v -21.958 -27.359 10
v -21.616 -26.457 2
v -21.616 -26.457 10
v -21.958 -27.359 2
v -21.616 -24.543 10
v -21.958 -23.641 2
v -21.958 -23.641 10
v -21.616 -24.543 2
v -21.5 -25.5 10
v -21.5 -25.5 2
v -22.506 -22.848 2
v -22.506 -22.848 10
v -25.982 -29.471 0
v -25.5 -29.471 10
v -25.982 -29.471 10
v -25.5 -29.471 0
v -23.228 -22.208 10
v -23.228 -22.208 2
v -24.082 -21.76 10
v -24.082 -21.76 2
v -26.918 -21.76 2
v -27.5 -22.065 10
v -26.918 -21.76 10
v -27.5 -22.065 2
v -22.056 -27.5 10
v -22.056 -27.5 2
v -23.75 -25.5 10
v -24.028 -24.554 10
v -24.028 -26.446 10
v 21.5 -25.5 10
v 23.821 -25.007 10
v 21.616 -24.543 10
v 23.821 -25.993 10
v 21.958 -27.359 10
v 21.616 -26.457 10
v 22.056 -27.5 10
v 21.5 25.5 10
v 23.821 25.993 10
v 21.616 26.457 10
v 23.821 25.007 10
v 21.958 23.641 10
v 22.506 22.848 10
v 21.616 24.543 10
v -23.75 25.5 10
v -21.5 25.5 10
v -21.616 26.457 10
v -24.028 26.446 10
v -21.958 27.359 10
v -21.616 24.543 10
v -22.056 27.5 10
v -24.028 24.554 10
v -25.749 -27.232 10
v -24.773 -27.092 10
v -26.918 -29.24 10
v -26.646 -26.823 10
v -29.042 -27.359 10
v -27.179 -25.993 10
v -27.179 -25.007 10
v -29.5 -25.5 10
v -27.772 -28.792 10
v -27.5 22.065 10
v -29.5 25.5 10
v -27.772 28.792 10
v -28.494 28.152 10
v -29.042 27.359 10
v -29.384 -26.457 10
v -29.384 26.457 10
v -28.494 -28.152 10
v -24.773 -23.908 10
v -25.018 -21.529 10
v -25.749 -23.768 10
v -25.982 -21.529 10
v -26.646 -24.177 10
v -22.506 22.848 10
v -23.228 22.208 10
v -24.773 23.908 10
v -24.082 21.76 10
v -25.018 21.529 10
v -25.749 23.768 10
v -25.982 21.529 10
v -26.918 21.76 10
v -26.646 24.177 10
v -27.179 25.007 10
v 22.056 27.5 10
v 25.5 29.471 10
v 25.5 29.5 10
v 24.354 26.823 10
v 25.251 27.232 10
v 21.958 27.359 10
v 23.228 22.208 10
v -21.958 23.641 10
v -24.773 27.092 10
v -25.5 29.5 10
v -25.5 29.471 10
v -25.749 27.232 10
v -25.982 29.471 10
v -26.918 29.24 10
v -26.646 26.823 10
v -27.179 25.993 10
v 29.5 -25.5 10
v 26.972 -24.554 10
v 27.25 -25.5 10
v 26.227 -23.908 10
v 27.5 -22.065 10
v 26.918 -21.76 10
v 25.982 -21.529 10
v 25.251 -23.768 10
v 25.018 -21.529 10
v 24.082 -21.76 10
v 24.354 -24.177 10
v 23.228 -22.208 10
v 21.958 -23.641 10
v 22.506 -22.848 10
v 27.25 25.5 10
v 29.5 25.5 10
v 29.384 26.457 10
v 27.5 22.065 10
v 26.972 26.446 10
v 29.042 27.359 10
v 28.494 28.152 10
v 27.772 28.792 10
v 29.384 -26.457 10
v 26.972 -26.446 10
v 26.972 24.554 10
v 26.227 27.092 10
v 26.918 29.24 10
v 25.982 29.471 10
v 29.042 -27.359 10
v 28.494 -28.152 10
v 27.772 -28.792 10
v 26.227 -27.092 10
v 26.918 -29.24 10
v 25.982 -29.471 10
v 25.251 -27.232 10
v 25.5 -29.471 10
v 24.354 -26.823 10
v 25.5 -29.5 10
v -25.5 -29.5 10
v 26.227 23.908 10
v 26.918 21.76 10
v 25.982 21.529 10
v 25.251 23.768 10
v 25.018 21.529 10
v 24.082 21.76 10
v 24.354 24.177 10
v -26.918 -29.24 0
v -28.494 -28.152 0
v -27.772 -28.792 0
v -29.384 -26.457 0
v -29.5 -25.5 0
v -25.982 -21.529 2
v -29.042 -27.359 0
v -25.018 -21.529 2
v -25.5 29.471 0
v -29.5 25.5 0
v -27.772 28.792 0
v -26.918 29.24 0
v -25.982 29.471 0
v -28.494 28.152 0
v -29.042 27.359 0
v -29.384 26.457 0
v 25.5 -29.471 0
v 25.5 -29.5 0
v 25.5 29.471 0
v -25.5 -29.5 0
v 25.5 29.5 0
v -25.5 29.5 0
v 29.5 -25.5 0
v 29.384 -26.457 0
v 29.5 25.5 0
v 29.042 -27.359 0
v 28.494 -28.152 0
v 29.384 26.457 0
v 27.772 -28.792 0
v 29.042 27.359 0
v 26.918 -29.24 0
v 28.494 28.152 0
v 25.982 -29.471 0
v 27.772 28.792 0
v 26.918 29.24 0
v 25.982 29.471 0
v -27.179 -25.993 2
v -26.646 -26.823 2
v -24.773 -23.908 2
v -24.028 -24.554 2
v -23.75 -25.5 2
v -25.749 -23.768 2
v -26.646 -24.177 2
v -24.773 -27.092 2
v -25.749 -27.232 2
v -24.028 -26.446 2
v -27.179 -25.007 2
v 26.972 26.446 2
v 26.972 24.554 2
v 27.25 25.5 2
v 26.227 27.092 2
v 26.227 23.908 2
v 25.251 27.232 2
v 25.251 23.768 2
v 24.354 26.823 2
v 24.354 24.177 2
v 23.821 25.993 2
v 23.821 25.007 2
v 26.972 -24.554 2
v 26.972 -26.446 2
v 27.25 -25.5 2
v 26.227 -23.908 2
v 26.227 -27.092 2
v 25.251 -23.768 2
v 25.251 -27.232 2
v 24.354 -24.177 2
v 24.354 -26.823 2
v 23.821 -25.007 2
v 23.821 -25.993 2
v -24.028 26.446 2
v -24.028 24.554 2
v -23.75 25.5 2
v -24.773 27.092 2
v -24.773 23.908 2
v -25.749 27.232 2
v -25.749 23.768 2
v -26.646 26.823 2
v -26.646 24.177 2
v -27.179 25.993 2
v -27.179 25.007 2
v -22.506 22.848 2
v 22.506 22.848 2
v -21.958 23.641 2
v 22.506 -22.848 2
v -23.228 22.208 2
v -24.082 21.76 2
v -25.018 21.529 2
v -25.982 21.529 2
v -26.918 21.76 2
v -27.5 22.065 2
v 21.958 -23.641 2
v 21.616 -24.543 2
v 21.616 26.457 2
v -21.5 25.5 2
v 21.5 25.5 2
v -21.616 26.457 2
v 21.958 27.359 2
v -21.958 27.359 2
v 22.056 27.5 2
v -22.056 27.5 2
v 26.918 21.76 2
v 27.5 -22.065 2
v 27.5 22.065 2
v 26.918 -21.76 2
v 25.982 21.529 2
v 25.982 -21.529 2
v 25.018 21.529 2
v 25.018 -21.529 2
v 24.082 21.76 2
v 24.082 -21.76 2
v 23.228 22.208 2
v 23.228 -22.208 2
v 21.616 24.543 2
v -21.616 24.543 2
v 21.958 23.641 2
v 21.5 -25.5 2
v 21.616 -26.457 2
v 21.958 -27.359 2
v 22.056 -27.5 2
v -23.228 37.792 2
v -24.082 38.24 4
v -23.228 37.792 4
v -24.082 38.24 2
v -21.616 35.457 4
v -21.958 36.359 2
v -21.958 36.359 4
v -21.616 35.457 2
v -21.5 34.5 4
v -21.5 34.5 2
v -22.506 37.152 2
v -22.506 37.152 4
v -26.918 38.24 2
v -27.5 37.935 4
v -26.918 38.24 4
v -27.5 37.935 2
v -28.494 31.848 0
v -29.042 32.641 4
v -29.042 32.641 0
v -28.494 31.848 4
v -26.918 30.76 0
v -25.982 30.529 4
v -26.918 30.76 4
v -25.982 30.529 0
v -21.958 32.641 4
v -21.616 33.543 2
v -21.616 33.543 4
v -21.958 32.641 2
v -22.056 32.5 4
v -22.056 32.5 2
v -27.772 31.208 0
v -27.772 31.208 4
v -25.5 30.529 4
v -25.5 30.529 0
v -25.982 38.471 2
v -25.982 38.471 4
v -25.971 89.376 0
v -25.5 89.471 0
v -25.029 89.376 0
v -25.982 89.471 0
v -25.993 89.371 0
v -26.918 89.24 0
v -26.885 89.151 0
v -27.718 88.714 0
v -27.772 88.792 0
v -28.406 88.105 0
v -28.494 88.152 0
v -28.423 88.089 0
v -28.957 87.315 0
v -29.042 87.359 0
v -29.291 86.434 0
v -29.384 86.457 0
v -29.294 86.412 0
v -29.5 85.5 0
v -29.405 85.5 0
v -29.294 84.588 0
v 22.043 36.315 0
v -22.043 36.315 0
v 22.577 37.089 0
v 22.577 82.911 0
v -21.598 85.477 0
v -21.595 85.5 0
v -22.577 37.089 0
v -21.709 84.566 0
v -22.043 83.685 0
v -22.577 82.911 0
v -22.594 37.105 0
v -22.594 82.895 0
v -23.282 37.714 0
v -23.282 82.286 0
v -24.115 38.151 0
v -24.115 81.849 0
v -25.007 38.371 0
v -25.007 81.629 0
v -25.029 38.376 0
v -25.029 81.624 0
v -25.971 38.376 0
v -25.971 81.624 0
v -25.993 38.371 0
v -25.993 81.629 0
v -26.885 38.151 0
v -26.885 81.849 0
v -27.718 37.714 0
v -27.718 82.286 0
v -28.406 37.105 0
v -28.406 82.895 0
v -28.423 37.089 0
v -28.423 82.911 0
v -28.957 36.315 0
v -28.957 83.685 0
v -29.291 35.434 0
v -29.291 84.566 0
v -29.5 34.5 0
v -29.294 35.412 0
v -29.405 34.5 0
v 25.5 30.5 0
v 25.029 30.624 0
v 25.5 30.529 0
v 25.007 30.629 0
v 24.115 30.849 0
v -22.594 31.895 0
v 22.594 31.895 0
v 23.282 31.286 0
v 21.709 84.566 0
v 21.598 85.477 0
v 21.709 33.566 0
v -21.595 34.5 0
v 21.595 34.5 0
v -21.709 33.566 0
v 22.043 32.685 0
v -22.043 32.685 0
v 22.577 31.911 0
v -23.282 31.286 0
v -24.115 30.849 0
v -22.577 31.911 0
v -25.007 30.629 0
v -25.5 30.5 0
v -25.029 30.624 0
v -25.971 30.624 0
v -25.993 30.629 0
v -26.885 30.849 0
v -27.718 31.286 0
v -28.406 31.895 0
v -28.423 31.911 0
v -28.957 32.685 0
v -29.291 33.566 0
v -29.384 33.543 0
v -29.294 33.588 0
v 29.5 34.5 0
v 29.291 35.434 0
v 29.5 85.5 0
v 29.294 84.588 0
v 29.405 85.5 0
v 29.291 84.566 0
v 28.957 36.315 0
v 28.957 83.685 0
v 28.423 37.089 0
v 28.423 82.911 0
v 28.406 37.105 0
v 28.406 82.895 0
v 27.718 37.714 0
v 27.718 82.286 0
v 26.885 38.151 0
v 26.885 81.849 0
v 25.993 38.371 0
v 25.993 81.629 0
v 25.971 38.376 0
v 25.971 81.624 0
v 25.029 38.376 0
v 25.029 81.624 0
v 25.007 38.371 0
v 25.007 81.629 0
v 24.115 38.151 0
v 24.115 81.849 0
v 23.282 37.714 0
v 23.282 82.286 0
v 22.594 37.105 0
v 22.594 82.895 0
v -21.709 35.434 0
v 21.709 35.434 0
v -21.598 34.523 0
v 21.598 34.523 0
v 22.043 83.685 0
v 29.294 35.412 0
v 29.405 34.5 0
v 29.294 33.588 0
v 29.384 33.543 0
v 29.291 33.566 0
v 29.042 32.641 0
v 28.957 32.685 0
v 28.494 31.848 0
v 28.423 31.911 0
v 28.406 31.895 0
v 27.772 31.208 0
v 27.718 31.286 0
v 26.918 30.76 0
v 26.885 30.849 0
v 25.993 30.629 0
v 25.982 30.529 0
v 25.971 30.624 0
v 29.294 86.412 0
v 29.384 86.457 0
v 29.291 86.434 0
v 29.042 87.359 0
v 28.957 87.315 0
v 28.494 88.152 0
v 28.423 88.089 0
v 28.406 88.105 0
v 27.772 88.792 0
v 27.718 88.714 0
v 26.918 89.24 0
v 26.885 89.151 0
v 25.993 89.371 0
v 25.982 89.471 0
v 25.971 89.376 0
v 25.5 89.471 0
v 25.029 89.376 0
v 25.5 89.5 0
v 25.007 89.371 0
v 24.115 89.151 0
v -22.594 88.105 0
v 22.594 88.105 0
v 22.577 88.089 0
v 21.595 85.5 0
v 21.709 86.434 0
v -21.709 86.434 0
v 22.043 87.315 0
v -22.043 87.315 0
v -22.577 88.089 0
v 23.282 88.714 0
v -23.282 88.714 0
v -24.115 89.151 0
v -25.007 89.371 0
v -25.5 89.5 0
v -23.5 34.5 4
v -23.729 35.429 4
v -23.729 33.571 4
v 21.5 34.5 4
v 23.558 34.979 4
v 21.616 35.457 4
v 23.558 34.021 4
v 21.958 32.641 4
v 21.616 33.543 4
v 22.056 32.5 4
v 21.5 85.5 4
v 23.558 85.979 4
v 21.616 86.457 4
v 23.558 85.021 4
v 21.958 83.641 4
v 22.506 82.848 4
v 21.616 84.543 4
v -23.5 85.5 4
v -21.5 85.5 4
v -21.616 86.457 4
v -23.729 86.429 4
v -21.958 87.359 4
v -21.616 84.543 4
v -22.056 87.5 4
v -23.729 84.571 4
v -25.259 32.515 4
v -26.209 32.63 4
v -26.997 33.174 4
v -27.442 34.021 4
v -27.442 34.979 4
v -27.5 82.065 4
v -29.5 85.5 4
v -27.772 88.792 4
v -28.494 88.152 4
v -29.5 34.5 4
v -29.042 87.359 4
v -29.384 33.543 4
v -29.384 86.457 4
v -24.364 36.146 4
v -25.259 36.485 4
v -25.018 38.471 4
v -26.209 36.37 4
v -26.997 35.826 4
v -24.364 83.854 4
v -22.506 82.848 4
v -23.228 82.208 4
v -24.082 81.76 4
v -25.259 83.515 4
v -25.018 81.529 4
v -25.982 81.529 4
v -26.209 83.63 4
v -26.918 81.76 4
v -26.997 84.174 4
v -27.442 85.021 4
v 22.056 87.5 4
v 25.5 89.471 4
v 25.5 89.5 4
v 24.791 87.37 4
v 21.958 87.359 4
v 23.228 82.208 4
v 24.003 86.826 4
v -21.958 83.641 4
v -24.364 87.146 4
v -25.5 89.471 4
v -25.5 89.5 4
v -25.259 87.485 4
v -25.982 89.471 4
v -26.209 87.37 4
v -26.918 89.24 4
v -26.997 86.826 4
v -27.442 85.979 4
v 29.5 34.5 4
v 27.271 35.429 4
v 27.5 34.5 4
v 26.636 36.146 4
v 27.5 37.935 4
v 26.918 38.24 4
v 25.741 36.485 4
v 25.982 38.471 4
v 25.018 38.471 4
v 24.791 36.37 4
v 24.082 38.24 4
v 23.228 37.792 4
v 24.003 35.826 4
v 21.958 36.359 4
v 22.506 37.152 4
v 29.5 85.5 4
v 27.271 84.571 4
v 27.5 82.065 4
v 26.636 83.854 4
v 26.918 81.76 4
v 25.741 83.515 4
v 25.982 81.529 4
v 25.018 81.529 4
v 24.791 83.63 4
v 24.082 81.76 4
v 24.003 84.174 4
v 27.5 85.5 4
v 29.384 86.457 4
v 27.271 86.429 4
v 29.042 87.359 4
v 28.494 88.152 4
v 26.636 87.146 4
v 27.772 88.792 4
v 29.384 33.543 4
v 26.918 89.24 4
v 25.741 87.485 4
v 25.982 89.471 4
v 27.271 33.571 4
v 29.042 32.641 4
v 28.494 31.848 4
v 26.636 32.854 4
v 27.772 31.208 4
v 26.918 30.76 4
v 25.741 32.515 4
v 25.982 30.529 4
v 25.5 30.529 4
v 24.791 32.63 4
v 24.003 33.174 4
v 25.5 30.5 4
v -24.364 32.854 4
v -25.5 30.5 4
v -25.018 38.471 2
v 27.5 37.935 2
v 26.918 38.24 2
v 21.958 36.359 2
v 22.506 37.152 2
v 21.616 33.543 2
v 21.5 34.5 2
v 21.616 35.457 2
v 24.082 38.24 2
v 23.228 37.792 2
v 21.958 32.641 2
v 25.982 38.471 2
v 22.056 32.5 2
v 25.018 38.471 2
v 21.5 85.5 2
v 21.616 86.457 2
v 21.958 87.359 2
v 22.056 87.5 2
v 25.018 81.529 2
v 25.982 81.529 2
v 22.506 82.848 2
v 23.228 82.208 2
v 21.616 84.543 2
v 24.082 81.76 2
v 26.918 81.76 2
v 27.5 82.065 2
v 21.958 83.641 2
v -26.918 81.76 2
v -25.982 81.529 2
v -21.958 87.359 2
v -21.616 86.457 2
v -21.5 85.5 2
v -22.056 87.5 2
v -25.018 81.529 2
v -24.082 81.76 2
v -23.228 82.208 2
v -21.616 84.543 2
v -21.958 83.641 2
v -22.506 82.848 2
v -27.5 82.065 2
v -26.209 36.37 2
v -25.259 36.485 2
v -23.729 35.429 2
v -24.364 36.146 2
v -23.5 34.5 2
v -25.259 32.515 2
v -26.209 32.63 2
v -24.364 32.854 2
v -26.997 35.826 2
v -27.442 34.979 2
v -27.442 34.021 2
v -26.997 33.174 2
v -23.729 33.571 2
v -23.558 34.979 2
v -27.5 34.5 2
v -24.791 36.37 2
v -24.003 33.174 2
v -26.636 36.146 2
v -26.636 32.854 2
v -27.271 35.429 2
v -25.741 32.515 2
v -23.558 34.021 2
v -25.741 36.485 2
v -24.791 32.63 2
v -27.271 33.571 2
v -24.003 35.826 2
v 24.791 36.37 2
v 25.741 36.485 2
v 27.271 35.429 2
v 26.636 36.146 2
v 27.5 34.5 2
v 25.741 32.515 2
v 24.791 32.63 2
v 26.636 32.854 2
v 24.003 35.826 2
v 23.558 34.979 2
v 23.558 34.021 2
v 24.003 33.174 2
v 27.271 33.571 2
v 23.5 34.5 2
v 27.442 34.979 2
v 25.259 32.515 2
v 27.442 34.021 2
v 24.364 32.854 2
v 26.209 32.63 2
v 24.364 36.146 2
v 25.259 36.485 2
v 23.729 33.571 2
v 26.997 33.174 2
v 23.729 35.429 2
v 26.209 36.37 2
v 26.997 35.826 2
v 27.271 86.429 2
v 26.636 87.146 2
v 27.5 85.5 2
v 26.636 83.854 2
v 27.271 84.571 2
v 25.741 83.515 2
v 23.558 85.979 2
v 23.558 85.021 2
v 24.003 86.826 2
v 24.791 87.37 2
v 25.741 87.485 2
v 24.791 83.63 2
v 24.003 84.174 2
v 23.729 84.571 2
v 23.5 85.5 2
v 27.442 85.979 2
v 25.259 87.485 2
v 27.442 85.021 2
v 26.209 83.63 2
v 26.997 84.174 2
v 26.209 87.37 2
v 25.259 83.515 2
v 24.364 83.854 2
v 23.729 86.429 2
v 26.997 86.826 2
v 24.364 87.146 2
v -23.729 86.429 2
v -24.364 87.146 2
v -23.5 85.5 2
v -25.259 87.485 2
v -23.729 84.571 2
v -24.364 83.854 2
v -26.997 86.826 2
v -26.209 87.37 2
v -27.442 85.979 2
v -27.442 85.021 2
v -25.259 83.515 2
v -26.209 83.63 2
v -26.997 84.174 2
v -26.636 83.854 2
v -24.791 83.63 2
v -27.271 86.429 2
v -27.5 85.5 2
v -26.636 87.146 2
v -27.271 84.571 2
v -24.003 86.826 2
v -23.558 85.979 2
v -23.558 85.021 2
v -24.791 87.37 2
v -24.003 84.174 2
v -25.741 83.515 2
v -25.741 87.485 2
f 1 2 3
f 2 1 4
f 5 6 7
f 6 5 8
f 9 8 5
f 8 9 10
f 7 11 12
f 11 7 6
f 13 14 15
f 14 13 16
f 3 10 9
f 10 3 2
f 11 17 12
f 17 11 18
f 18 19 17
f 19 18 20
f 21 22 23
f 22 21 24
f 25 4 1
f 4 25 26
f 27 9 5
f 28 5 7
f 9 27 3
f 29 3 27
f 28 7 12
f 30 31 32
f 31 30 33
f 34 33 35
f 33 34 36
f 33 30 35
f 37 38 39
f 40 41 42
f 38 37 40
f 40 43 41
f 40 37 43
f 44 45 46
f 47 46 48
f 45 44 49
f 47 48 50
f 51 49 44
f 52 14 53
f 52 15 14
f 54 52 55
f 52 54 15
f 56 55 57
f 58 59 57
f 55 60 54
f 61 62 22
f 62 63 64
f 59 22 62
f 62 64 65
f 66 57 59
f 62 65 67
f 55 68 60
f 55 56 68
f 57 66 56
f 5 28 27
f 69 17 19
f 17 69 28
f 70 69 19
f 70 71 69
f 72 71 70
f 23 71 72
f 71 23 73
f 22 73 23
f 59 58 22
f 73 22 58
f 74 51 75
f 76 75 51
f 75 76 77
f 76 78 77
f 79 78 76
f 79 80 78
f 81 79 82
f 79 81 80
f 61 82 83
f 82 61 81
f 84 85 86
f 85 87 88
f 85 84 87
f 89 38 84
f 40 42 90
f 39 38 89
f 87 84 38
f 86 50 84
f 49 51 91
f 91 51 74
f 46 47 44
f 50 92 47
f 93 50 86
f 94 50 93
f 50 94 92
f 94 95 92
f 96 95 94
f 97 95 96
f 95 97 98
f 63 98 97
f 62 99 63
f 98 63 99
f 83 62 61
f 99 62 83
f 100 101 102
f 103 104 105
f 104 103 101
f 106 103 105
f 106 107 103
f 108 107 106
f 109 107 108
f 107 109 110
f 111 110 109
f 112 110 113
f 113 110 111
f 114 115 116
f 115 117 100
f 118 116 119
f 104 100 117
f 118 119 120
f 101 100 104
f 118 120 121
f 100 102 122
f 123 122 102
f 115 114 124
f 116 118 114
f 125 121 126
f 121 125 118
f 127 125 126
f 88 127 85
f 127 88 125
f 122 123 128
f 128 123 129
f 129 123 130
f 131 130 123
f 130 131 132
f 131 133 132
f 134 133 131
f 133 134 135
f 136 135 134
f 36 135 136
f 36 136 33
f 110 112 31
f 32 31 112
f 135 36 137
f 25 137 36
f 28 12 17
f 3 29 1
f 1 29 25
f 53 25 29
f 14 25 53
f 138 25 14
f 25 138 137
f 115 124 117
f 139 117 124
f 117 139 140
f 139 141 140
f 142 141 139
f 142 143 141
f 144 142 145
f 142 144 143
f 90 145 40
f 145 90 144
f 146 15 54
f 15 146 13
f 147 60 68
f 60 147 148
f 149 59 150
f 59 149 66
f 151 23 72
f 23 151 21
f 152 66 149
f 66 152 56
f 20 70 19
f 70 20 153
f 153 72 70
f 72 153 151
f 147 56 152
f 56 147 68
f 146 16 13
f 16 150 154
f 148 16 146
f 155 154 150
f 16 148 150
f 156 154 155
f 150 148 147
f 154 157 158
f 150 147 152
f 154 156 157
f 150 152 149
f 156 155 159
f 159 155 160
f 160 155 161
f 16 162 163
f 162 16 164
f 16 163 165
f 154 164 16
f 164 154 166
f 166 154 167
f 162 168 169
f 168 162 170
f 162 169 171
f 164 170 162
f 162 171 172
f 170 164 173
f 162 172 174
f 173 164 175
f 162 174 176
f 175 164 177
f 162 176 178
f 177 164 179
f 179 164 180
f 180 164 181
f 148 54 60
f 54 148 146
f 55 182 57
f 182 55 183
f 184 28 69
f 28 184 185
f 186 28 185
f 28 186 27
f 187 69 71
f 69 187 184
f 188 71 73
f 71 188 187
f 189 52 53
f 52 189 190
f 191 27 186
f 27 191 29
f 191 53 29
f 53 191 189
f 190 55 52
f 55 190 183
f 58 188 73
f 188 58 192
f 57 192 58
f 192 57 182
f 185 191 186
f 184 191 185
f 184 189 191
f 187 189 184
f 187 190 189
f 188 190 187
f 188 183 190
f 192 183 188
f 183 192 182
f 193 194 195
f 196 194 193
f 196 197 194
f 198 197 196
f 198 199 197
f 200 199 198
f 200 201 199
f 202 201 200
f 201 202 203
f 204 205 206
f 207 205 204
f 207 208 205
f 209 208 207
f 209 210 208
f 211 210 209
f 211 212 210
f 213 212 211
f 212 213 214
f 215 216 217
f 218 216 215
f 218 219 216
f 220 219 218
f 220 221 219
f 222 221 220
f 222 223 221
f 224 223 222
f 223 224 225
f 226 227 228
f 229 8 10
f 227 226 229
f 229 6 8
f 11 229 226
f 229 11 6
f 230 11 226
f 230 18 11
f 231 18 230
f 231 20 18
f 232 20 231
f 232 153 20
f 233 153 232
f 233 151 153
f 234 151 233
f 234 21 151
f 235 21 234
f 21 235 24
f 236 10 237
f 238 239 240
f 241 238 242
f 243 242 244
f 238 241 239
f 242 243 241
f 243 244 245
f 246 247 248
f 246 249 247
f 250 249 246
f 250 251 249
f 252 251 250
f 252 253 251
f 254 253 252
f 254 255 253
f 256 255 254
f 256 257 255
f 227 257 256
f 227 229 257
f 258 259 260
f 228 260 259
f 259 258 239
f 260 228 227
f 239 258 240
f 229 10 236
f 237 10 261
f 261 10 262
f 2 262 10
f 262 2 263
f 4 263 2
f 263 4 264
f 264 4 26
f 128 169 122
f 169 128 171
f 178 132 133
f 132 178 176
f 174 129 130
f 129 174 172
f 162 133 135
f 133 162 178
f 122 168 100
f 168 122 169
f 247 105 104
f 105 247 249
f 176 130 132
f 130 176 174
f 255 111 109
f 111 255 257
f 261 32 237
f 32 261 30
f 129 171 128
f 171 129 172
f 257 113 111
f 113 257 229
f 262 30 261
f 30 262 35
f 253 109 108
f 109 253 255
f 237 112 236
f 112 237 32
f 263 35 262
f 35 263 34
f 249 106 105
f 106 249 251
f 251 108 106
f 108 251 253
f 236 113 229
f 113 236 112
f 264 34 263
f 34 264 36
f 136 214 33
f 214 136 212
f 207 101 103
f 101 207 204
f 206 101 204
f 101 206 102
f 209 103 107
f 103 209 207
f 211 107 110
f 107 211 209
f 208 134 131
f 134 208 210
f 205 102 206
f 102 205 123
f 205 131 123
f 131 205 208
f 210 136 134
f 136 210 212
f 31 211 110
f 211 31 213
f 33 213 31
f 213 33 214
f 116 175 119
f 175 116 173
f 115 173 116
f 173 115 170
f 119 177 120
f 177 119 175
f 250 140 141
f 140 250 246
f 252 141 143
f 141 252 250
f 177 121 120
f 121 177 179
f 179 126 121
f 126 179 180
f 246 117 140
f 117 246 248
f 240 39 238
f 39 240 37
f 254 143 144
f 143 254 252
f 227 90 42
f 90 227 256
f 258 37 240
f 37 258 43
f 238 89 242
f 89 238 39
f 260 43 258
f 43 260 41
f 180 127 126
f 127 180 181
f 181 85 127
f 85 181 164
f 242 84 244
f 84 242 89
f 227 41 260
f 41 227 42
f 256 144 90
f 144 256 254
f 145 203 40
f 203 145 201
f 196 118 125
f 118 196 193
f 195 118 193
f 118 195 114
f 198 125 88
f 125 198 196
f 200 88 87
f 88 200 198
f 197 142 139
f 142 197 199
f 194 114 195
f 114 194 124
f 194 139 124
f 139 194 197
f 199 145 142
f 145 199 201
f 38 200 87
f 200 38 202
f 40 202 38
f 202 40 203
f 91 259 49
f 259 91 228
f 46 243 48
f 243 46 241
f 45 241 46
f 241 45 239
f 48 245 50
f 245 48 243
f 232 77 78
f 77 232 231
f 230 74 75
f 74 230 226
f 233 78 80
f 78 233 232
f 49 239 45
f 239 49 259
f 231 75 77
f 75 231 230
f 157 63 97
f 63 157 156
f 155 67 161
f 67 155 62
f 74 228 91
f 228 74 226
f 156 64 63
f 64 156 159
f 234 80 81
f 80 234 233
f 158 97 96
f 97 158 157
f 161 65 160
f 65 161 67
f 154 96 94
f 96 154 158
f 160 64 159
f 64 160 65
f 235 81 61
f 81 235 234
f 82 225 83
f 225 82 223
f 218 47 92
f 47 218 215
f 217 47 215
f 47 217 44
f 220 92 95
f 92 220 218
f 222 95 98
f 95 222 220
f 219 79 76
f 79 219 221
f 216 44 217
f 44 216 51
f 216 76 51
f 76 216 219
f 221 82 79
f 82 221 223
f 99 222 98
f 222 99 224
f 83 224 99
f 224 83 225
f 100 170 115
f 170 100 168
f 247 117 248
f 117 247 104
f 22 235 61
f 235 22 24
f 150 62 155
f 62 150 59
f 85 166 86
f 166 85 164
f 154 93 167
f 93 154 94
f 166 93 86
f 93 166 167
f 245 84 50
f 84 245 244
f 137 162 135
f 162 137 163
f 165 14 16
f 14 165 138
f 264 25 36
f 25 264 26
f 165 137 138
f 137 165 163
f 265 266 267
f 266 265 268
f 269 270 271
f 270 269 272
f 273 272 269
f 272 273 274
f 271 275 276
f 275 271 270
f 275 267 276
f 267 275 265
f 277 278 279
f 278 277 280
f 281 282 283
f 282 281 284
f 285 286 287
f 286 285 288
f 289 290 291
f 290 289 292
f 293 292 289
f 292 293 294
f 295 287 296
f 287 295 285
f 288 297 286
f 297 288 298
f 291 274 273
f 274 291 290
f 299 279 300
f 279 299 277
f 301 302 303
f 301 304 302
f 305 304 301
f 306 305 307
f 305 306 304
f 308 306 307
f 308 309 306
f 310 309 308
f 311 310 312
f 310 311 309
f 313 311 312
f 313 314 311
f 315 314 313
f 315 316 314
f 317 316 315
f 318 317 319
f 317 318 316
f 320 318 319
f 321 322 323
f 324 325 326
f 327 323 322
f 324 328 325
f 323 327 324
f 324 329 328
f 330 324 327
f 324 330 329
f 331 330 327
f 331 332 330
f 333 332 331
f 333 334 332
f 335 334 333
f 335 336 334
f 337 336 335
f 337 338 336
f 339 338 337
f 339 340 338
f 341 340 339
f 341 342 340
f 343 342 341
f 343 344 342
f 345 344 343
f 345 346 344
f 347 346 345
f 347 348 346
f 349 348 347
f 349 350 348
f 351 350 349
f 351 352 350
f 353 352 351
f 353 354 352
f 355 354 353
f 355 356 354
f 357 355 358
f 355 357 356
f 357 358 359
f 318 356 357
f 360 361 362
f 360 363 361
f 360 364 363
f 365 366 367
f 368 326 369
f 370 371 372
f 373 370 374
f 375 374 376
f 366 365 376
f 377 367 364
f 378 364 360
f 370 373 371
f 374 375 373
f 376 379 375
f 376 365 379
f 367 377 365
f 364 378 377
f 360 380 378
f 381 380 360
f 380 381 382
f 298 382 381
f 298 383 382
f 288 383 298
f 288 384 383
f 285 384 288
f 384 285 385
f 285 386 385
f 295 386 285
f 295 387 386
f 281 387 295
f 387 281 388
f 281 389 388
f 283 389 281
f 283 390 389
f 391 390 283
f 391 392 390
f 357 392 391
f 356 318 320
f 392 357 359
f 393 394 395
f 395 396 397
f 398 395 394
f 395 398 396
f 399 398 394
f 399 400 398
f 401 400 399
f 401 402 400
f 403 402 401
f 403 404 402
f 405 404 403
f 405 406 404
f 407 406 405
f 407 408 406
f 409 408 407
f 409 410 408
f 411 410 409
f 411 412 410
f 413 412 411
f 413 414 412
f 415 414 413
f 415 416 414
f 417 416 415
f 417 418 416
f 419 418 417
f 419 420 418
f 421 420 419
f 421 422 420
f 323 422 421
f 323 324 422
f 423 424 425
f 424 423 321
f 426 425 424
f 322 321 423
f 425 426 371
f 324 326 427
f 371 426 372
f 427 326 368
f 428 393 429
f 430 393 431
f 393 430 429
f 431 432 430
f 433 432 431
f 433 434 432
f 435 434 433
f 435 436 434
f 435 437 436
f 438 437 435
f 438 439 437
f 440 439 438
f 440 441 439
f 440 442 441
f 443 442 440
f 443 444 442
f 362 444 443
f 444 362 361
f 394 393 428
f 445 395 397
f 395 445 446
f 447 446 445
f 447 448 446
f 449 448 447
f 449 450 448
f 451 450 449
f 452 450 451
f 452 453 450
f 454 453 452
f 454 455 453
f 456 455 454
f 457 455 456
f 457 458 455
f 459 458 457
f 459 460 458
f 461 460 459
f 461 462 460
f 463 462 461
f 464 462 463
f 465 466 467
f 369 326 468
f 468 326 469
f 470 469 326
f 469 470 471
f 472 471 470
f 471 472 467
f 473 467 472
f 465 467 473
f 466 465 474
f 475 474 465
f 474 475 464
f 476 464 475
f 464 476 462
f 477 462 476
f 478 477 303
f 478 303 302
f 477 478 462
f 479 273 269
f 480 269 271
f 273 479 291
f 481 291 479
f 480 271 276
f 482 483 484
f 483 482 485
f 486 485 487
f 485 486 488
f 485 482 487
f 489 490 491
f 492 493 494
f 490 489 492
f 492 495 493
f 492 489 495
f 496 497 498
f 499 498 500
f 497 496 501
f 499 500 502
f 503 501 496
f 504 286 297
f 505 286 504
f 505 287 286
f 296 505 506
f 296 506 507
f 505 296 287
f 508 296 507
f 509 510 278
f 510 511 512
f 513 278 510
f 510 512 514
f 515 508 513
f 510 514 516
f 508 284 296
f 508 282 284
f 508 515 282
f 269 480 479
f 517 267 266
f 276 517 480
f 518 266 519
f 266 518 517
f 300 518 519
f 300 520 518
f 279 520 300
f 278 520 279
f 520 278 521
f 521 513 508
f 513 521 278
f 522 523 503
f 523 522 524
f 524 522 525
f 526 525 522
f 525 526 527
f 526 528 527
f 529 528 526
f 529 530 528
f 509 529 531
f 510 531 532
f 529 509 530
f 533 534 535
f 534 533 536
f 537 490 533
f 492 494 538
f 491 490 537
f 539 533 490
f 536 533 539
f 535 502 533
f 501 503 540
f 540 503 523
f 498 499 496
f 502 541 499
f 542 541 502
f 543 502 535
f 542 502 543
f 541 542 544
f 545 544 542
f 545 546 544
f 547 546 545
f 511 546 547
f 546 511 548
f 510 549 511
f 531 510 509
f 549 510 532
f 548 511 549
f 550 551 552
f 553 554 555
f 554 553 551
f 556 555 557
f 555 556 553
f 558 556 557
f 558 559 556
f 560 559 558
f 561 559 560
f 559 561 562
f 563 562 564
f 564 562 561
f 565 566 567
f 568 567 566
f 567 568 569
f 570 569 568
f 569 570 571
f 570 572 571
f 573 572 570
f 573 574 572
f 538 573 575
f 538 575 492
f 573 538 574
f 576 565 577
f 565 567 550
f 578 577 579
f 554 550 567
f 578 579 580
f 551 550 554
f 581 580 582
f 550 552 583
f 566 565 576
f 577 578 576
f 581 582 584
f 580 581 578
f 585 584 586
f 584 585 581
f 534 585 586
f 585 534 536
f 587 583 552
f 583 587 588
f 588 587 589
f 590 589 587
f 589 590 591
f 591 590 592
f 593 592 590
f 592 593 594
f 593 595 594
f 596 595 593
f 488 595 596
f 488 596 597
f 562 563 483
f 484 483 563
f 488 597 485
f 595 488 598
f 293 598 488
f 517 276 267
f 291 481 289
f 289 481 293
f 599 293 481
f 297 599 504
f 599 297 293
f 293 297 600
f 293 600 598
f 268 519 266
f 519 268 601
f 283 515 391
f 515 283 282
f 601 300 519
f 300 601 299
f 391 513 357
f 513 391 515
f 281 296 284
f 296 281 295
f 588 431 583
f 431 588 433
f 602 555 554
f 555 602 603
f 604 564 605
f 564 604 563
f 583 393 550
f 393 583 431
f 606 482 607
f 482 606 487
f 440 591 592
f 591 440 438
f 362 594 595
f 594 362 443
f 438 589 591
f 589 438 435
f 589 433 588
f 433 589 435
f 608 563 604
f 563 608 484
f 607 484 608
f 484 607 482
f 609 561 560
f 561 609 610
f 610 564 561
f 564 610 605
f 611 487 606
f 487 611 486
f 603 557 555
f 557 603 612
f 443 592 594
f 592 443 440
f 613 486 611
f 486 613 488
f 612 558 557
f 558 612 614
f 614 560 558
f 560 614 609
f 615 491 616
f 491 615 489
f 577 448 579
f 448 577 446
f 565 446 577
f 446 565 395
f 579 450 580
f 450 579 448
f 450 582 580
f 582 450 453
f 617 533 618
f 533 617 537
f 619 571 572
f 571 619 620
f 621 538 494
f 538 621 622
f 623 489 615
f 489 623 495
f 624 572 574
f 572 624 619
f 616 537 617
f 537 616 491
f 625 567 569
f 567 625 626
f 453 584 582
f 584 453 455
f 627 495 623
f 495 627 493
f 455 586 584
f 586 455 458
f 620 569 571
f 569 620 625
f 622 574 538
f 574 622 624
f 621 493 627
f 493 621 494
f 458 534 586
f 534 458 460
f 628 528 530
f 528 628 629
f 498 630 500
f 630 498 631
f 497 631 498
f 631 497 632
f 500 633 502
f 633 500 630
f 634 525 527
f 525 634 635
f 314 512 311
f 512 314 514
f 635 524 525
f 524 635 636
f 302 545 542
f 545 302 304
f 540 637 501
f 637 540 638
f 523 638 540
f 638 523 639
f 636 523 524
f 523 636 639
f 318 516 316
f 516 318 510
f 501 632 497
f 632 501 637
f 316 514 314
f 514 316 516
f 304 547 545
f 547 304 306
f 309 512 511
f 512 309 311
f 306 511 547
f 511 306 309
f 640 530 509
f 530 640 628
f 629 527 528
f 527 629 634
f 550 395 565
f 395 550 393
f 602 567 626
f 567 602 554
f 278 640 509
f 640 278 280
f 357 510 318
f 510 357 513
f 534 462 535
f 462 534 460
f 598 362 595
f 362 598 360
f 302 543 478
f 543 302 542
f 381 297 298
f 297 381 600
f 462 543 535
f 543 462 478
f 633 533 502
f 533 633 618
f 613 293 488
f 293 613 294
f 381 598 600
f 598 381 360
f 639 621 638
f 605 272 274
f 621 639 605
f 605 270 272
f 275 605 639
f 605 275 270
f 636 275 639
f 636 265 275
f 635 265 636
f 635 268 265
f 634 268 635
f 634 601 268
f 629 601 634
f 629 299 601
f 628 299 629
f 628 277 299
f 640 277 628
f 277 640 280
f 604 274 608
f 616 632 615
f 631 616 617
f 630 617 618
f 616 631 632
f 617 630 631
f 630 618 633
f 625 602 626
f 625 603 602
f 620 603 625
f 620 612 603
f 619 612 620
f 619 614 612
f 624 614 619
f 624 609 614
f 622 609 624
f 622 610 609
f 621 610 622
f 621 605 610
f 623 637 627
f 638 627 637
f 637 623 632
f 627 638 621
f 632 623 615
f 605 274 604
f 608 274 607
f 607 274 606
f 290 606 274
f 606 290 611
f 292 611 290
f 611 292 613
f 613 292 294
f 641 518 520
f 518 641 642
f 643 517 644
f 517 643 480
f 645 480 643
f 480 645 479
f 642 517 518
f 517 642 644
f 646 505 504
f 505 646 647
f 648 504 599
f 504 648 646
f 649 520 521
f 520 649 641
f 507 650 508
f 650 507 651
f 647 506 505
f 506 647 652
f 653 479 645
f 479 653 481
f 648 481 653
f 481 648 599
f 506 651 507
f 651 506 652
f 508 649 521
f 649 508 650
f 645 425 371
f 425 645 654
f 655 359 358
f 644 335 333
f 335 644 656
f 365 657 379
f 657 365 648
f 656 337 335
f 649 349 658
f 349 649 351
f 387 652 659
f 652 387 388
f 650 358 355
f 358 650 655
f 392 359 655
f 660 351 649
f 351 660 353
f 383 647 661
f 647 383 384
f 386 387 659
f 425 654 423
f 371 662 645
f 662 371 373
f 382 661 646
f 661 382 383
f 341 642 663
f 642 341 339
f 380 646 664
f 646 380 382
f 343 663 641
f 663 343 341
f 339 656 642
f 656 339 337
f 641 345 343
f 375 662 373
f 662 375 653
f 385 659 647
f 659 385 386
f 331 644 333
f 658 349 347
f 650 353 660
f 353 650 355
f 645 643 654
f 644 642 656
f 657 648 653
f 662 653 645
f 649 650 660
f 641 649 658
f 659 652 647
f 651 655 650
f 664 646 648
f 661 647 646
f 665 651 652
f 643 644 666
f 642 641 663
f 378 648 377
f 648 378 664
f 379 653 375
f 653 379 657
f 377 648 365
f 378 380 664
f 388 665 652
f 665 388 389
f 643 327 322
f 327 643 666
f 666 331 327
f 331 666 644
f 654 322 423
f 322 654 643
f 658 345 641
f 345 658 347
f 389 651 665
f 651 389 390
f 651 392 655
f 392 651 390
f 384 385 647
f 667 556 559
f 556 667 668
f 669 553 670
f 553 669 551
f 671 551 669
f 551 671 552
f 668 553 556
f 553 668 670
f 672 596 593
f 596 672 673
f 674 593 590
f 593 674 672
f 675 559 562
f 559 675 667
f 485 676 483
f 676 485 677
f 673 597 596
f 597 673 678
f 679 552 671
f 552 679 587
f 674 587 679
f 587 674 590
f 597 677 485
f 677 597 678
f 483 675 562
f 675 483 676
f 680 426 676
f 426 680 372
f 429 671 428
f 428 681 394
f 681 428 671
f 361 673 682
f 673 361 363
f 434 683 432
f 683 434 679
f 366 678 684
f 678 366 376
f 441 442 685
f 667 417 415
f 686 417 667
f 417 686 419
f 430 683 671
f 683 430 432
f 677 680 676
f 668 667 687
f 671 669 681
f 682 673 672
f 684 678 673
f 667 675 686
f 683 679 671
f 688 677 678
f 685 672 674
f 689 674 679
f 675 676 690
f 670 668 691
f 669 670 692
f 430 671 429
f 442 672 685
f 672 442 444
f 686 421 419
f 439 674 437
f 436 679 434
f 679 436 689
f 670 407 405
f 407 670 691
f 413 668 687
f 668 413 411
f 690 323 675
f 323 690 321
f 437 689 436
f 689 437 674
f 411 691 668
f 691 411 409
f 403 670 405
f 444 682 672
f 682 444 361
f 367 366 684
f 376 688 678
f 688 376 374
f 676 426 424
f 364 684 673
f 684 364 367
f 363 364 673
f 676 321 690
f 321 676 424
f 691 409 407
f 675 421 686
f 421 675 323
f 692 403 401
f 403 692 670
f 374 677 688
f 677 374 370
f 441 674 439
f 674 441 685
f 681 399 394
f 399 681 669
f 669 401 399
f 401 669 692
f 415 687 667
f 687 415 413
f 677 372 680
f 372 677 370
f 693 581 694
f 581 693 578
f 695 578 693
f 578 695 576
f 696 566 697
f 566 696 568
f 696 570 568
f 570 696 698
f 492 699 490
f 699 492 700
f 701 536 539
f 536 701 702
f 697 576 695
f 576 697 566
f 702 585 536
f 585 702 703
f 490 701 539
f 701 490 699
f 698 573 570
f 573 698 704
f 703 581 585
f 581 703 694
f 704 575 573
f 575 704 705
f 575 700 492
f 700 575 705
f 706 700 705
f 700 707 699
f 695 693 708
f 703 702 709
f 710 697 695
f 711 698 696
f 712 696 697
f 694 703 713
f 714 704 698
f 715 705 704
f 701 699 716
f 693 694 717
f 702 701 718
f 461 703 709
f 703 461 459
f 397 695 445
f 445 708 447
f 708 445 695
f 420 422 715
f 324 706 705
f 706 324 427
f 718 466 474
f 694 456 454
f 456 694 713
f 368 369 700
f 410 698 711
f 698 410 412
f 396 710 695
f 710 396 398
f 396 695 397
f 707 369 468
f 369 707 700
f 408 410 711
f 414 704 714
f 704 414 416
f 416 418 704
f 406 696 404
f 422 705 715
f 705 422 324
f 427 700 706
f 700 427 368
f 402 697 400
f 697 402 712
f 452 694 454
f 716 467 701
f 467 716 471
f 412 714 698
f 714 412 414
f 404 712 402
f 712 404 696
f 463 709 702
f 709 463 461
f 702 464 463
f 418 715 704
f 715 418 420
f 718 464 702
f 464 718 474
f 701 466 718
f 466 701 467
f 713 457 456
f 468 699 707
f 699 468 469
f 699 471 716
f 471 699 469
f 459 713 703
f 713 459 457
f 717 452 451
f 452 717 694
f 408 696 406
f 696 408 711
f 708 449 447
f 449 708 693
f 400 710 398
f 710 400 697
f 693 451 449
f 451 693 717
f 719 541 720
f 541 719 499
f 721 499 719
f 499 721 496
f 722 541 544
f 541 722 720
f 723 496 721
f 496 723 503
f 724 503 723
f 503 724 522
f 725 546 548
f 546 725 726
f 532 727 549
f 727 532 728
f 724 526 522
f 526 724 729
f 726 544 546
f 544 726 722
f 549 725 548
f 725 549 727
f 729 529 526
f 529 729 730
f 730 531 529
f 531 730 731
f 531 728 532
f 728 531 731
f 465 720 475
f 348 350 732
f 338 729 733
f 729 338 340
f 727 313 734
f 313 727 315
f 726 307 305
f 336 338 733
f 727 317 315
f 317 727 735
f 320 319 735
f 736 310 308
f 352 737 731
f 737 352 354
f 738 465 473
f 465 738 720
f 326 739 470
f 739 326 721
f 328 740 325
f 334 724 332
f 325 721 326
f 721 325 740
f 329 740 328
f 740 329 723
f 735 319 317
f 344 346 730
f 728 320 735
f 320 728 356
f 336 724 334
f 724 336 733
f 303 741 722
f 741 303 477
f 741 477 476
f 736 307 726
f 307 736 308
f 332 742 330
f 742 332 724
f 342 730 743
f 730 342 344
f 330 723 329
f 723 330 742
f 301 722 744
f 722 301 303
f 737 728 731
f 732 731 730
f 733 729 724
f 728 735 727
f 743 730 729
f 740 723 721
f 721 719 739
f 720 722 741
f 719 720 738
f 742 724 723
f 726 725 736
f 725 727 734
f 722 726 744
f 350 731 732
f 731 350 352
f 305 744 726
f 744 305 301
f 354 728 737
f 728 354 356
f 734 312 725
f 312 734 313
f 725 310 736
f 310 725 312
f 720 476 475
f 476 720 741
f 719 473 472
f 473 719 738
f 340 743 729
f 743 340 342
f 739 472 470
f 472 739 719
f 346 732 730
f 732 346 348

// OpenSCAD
// Screwable Box for Espruino

PCB_LENGTH = 54;
PCB_WIDTH = 41.5;
PCB_HEIGHT = 8;

// It's so close, let's just make it square
BOXX = 55;// PCB_LENGTH+1;
BOXY = 55; //PCB_WIDTH+14;
BOXZ = PCB_HEIGHT+2;

box_bottom(BOXX, BOXY, BOXZ);
translate([0,BOXY+5,4]) scale([1,1,-1]) box_top(BOXX, BOXY, 4);

//color("red") translate([0,0,2+PCB_HEIGHT/2]) cube([PCB_LENGTH, PCB_WIDTH, PCB_HEIGHT], center=true);

module box_bottom(width, length, height) {
  screw_inner = 1.75;
  screw_outer = 4;
  border = 2;
  sw = width/2 - screw_outer/2;
  sl = length/2 - screw_outer/2;
  for (i = [ [  -sw,  -sl,   0],
          [ sw, -sl, 0],
          [ sw, sl, 0],
          [ -sw, sl, 0] ]) {
    translate(i)
    difference() {
      cylinder(h = height, r=screw_outer, $fs=1);
      translate([0,0,2]) cylinder(h = height, r=screw_inner, $fs=1);
   }
  };
 // sides
 translate([width/2+1,0,height/2]) cube([border,sl*2,height], center=true);
 translate([-(width/2+1),0,height/2]) cube([border,sl*2,height], center=true);
 translate([0,length/2+1,height/2]) cube([sw*2,border,height], center=true); 
 translate([0,-(length/2+1),height/2]) cube([sw*2,border,height], center=true); 
// bottom
 translate([0,0,1]) cube([sw*2+screw_outer,sl*2+screw_outer,border], center=true);
}

module box_top(width, length, height) {
 screw_inner = 2;
 screw_outer = 4;
 border = 2;
 sw = width/2 - screw_outer/2;
 sl = length/2 - screw_outer/2;
 difference() {
  union() {
   for (i = [ [  -sw,  -sl,   0],
          [ sw, -sl, 0],
          [ sw, sl, 0],
          [ -sw, sl, 0] ]) {
    translate(i) cylinder(h = height, r=screw_outer, $fs=1);
  }
  // sides
  translate([width/2+1,0,height/2]) cube([border,sl*2,height], center=true);
  translate([-(width/2+1),0,height/2]) cube([border,sl*2,height], center=true);
  translate([0,length/2+1,height/2]) cube([sw*2,border,height], center=true); 
  translate([0,-(length/2+1),height/2]) cube([sw*2,border,height], center=true); 
  // top
  translate([0,0,1+height-border]) cube([sw*2+screw_outer*2,sl*2,border], center=true);
  translate([0,0,1+height-border]) cube([sw*2,sl*2+screw_outer*2,border], center=true);
 }
 union() {
  for (i = [ [  -sw,  -sl,   0],
          [ sw, -sl, 0],
          [ sw, sl, 0],
          [ -sw, sl, 0] ]) {
   translate(i) translate([0,0,-1]) cylinder(h = height+2, r=screw_inner, $fs=1);
   translate(i) translate([0,0,height-2]) cylinder(h = 2.1, r1 = screw_inner, r2 = screw_inner+2, $fs=1); 
   }
  }
 }
}
